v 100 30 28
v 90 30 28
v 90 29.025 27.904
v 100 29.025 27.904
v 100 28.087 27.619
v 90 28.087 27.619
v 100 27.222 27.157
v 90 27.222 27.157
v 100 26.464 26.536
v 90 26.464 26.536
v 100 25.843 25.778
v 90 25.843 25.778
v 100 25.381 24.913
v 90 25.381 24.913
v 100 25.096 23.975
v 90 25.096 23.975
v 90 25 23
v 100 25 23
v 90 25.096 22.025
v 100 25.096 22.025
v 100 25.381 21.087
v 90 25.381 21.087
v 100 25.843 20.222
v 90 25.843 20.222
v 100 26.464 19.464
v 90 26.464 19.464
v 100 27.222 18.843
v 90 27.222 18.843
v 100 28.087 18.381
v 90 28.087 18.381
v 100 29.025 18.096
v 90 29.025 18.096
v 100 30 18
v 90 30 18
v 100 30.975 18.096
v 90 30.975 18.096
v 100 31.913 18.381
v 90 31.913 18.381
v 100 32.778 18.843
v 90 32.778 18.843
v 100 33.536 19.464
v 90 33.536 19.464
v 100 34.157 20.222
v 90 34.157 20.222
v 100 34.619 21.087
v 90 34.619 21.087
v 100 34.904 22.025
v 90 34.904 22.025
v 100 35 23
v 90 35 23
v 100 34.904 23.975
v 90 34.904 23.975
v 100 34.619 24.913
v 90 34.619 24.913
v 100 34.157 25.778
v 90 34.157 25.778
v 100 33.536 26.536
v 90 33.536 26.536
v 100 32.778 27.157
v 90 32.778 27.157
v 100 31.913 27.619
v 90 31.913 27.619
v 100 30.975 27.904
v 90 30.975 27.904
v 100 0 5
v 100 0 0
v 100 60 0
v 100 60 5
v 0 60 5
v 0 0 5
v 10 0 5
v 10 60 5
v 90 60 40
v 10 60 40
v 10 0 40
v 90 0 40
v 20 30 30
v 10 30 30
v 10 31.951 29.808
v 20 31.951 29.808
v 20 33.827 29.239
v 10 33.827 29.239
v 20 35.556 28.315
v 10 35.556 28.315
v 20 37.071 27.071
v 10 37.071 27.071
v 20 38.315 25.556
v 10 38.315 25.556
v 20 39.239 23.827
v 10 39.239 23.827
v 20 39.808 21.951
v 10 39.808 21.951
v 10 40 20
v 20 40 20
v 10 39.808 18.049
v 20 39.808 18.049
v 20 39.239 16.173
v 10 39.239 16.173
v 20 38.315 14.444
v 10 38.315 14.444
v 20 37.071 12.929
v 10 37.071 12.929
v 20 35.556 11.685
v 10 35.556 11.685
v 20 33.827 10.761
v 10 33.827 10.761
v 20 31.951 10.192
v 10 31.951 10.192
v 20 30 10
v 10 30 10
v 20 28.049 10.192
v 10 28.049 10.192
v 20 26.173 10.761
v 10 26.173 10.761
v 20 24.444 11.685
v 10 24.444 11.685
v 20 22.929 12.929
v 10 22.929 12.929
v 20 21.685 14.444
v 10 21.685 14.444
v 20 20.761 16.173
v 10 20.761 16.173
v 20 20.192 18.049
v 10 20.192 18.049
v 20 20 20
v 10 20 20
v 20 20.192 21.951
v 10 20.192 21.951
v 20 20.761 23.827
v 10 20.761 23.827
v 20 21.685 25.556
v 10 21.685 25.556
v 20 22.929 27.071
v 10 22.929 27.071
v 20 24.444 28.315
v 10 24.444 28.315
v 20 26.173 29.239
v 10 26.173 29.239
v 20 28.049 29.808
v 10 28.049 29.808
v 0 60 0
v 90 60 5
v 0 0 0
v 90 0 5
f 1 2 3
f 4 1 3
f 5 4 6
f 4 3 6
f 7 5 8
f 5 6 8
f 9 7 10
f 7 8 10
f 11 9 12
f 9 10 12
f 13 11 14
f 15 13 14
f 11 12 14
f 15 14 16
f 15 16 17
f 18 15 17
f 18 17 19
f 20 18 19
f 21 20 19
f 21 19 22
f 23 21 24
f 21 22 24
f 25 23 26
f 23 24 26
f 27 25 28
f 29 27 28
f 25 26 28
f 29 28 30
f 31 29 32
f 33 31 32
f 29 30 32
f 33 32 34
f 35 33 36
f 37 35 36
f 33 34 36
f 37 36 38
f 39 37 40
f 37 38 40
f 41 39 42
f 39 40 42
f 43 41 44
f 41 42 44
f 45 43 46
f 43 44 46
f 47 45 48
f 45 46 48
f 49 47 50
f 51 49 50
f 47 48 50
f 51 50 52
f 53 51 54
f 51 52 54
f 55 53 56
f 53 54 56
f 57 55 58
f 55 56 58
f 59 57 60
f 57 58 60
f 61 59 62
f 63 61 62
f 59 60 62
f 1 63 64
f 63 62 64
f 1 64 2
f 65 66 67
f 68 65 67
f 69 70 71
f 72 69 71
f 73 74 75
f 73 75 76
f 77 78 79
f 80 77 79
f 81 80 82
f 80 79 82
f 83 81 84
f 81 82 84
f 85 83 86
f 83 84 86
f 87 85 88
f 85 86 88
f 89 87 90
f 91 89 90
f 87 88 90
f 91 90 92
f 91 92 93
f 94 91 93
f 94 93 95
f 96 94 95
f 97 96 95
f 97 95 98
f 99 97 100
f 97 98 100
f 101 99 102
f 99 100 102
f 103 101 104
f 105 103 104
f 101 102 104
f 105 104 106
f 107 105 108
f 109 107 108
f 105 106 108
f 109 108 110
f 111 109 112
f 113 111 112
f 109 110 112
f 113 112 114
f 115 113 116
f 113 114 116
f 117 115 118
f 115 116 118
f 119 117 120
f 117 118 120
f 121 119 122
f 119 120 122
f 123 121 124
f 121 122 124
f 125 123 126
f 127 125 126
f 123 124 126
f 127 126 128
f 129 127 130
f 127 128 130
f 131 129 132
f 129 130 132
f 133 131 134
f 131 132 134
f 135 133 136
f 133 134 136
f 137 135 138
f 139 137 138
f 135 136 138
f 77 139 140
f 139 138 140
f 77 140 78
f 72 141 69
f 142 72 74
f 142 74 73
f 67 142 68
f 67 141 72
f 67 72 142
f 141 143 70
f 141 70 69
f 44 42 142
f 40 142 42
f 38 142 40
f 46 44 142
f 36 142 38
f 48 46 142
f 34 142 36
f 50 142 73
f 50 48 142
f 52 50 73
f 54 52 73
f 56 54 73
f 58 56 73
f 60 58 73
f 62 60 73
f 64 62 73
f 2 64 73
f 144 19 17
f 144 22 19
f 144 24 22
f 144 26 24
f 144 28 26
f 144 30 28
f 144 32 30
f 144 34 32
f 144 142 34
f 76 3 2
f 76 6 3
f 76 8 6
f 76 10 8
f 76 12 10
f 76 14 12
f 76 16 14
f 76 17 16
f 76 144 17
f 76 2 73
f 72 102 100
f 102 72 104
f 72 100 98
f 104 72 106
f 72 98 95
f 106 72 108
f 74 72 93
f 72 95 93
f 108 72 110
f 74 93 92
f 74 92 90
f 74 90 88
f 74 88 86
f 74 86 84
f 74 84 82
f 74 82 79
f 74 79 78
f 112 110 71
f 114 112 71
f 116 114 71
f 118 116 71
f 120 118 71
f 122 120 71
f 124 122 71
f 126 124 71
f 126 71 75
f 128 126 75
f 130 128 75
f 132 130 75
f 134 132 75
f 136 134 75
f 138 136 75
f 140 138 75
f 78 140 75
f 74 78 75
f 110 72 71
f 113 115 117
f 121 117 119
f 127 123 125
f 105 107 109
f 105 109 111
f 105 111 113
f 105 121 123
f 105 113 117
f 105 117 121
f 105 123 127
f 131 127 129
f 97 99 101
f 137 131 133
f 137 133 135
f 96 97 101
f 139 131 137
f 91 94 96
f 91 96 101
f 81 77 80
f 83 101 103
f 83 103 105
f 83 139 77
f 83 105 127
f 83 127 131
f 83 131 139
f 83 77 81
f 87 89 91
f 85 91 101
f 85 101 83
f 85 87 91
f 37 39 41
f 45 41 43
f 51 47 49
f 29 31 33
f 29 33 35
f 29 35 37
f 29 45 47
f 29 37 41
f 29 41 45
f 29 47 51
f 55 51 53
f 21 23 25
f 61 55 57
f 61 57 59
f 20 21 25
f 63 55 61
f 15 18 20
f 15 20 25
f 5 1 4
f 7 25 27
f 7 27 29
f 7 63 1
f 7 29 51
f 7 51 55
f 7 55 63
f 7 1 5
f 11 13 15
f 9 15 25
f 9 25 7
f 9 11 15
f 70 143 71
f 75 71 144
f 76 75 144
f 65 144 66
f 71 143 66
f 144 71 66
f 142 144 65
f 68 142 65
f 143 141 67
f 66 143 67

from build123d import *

# Parameters (mm, degrees)
SKETCH1_W           = 100
SKETCH1_H           = 60
BOSS_EXTRUDE1_DEPTH = 40
SKETCH2_W           = 10
SKETCH2_H           = 35
CUT_EXTRUDE1_DEPTH  = 124.288280059
SKETCH3_R           = 10
CUT_EXTRUDE2_DEPTH  = 10
SKETCH4_R           = 5
BOSS_EXTRUDE2_DEPTH = 10


with BuildPart() as part:
    # Sketch1 → Boss-Extrude1 (new body)
    with BuildSketch(Plane.XY):
        with Locations((50, 30)):
            Rectangle(SKETCH1_W, SKETCH1_H)
    extrude(amount=BOSS_EXTRUDE1_DEPTH)

    # Sketch2 → Cut-Extrude1 (cut, through all)
    with BuildSketch(Plane.XZ):
        with Locations((5, 22.5)):
            Rectangle(SKETCH2_W, SKETCH2_H)
        with Locations((95, 22.5)):
            Rectangle(SKETCH2_W, SKETCH2_H)
    extrude(amount=-CUT_EXTRUDE1_DEPTH, mode=Mode.SUBTRACT)

    # Sketch3 → Cut-Extrude2 (cut)
    with BuildSketch(Plane.ZY.offset(-10)):
        with Locations((20, 30)):
            Circle(SKETCH3_R)
    extrude(amount=-CUT_EXTRUDE2_DEPTH, mode=Mode.SUBTRACT)

    # Sketch4 → Boss-Extrude2 (add)
    with BuildSketch(Plane(origin=(90, 0, 0), x_dir=(0, 0, -1), z_dir=(1, 0, 0))):
        with Locations(Location((-23, 30, 0), (0, 0, 180))):
            Circle(SKETCH4_R)
    extrude(amount=BOSS_EXTRUDE2_DEPTH)


solid = part.part
